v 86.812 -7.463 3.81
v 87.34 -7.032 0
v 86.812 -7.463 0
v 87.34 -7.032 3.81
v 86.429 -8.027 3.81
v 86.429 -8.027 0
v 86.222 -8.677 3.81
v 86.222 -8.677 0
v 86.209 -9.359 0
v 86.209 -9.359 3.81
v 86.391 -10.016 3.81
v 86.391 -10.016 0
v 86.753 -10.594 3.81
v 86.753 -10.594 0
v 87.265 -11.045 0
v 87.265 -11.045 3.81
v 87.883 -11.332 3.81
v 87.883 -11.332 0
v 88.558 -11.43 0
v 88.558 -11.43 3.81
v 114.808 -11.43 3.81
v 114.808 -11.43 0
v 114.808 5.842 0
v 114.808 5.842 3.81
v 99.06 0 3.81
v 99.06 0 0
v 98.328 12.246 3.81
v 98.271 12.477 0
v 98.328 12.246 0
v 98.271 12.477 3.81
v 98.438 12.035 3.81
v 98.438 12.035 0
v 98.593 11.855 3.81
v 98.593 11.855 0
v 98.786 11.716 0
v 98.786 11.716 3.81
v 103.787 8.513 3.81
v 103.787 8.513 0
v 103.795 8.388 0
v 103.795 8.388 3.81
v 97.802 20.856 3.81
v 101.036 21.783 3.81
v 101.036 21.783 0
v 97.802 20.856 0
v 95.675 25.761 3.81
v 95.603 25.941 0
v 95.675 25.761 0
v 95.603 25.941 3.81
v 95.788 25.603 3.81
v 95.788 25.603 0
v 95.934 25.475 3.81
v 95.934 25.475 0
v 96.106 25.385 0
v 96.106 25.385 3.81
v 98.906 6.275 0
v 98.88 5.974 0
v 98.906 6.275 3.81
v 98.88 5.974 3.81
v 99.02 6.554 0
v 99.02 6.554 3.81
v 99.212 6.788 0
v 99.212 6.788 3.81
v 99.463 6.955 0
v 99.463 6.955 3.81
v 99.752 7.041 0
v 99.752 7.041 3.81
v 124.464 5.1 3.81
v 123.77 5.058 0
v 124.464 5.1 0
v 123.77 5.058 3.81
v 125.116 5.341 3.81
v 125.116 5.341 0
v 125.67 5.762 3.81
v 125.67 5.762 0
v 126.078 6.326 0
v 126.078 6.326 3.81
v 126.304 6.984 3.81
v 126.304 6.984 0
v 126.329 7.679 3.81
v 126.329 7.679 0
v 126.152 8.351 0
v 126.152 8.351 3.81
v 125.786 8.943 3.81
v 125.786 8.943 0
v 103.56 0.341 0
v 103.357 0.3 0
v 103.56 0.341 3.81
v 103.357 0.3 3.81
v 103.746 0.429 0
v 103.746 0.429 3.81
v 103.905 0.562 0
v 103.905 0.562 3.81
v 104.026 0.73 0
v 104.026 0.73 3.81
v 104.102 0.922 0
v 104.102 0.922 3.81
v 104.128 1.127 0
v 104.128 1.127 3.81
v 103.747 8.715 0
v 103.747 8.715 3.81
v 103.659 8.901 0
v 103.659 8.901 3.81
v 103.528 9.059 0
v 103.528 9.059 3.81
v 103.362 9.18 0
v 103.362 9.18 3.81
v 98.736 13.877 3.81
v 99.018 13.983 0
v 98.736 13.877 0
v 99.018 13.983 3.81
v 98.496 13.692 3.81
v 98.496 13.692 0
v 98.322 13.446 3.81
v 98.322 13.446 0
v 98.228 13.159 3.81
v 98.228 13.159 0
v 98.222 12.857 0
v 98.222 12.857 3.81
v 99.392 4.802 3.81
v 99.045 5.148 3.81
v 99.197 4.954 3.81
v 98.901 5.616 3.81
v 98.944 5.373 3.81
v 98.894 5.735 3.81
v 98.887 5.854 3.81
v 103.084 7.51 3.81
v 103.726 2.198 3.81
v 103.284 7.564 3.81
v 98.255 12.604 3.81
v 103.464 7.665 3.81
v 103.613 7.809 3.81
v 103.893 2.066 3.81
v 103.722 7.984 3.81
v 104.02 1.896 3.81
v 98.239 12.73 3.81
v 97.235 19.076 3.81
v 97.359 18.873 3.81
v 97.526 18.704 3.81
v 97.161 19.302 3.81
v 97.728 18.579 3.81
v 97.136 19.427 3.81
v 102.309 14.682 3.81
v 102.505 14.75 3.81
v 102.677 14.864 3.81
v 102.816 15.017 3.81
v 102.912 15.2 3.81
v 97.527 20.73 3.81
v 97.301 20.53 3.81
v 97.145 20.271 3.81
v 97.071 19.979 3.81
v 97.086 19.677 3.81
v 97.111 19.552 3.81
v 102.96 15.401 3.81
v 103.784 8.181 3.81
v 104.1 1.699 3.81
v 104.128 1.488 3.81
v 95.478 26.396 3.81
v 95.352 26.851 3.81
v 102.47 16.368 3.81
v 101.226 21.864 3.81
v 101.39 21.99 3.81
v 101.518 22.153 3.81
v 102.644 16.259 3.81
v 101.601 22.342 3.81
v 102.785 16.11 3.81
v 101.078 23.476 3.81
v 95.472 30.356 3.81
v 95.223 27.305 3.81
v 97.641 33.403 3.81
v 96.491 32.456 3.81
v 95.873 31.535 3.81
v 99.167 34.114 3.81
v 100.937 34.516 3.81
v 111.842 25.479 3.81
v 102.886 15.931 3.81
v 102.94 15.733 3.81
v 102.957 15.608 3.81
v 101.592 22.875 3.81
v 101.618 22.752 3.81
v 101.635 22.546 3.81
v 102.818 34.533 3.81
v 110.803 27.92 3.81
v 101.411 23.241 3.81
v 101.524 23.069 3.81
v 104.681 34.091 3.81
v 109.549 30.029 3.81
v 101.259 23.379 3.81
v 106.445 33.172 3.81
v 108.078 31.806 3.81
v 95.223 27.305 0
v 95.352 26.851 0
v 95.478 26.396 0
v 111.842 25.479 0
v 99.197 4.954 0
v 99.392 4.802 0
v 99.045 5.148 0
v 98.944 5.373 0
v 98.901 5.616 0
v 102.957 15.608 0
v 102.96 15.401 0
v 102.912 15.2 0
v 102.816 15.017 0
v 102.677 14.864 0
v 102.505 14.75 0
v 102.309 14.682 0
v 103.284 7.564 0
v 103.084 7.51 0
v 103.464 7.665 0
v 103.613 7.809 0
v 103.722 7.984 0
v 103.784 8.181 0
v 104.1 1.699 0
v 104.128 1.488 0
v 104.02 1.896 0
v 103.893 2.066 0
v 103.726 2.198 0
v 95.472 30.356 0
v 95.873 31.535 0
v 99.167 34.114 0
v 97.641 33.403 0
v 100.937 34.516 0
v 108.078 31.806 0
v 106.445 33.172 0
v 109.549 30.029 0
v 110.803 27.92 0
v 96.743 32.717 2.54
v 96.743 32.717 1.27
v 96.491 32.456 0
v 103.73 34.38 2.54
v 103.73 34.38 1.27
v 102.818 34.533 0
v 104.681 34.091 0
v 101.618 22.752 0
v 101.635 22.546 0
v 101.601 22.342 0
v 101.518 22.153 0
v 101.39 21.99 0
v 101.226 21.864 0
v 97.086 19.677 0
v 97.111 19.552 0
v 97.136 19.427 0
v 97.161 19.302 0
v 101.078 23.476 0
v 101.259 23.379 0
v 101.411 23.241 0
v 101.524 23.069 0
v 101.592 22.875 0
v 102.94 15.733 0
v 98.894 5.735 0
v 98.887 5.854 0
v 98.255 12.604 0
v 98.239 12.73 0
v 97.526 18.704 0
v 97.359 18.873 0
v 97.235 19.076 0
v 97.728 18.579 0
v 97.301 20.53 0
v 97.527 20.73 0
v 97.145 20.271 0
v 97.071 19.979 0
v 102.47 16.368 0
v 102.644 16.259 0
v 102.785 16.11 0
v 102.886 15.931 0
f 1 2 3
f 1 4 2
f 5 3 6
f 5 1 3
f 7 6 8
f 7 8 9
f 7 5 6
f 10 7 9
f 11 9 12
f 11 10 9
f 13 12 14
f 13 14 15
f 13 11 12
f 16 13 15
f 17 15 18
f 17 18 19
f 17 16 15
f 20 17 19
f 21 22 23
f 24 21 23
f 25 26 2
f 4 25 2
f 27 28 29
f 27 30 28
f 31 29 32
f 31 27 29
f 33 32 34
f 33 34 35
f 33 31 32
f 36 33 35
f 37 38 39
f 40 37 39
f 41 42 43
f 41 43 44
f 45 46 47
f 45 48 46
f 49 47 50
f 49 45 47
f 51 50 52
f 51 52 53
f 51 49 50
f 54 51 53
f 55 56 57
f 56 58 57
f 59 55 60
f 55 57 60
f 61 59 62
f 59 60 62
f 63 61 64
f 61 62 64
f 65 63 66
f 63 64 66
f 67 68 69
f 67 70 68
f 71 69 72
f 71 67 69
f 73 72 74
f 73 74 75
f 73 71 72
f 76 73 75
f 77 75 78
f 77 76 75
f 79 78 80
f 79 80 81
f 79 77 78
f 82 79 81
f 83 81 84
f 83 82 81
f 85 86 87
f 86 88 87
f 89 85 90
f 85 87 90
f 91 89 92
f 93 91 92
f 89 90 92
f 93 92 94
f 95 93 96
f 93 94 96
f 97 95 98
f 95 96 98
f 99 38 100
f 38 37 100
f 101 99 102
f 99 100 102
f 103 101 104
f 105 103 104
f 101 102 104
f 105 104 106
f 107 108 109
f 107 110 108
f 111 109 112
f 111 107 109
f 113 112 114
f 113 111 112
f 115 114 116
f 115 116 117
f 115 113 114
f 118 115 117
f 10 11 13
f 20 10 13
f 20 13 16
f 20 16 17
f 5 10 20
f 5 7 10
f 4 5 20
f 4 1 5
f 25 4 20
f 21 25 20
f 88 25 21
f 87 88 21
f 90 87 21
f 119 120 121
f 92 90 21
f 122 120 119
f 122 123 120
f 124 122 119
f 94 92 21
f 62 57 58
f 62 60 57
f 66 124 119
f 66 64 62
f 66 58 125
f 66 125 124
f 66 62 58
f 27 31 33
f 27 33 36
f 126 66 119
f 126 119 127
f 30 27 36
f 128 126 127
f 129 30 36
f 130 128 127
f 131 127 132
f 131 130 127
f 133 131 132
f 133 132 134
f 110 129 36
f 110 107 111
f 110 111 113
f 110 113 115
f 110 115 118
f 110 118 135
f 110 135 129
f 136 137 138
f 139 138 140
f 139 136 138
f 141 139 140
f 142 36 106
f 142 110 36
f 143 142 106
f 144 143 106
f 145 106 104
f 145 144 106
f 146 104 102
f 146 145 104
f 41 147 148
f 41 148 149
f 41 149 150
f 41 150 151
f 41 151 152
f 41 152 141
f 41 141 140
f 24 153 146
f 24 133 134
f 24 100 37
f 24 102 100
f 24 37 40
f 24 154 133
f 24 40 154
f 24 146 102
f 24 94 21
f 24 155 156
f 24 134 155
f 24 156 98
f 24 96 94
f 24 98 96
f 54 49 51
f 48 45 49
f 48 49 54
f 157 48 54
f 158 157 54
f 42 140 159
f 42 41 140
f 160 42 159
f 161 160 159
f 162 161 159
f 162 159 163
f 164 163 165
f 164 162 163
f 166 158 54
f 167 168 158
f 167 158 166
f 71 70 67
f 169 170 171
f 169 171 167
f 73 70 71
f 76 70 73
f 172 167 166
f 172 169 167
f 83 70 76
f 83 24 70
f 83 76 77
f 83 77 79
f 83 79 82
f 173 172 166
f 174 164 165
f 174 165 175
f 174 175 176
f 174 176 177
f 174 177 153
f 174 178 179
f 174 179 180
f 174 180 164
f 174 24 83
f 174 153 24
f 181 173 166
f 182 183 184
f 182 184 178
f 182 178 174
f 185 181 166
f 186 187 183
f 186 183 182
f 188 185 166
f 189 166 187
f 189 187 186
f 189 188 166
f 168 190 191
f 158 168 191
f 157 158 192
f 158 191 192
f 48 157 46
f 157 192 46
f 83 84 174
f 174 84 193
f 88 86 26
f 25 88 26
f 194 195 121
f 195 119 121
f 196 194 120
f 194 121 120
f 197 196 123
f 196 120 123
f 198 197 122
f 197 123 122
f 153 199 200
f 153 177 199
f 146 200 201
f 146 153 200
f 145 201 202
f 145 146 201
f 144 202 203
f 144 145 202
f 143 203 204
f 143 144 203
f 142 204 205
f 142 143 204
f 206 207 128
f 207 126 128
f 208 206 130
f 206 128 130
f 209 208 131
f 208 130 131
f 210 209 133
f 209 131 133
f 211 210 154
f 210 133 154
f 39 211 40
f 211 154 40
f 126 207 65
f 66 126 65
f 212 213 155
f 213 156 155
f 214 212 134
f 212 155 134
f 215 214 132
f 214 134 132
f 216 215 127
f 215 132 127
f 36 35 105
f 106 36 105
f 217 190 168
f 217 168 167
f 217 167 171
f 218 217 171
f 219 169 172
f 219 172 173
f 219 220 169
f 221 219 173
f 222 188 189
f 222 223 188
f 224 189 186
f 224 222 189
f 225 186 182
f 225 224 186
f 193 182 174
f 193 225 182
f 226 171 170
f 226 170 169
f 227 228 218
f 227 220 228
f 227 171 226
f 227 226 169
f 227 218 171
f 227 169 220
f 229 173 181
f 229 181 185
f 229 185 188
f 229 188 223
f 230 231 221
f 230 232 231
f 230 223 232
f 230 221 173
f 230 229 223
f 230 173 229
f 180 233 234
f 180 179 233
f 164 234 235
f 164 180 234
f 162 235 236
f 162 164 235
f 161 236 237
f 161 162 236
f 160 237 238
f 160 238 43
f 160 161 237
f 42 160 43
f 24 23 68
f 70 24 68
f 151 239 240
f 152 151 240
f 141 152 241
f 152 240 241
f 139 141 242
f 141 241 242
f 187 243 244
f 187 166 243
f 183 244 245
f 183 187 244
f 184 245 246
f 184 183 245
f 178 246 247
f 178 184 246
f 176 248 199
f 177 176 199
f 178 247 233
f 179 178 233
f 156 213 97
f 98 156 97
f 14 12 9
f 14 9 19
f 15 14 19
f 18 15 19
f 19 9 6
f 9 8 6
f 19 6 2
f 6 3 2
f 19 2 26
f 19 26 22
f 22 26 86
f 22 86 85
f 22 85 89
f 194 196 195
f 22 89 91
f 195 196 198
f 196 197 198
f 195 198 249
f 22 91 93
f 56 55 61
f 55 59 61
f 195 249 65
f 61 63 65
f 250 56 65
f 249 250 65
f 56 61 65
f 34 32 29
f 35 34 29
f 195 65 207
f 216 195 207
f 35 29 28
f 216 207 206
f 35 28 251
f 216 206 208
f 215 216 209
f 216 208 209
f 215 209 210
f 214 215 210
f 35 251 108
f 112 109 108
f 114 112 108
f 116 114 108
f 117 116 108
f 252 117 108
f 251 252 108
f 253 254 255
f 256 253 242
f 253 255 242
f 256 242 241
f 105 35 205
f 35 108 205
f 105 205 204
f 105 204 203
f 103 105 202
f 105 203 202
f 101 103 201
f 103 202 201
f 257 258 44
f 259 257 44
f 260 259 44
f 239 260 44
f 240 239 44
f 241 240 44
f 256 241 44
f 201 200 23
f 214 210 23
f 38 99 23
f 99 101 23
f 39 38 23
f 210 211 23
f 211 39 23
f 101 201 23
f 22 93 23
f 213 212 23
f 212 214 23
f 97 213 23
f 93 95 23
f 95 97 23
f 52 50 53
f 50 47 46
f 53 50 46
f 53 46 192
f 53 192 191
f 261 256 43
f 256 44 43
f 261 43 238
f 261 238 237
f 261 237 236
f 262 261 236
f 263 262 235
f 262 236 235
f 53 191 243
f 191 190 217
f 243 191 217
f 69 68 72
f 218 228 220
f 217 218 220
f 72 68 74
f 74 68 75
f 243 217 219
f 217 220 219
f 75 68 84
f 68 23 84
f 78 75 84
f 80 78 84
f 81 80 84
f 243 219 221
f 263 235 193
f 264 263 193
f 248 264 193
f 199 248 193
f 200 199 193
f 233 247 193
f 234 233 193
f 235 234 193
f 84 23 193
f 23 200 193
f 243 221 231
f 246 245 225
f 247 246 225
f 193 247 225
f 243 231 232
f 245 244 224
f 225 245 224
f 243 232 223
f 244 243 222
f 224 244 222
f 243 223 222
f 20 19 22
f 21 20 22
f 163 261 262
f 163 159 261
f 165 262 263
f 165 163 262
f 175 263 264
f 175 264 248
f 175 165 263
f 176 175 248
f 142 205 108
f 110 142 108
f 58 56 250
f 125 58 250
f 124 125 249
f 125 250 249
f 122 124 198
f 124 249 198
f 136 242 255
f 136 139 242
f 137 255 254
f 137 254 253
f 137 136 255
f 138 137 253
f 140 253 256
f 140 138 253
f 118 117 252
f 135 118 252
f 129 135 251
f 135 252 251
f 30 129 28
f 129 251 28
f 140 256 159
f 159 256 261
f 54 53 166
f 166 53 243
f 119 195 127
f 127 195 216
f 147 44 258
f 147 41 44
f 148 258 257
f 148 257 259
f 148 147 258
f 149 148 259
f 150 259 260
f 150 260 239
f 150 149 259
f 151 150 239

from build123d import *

# Parameters (mm, degrees)
F1_DEPTH = 3.81
F2_R     = 2.367737602
F3_R     = 0.8284878815
F4_R     = 1.016


with BuildPart() as f1:
    # F0 (on Top) → F1 (new body)
    with BuildSketch(Plane.XY):
        with BuildLine():
            Line((98.3983673645, -11.43), (99.06, -11.43))
            Line((99.06, -11.43), (114.808, -11.43))
            Line((114.808, -11.43), (114.808, 5.842))
            add(Edge.make_bspline(
                [(111.8424964318, 25.4789244169), (114.050069317, 19.269012489), (114.16942194, 10.4852159403), (114.808, 5.842)],
                knots=[0.6566118261, 0.6566118261, 0.6566118261, 0.6566118261, 1, 1, 1, 1], degree=3))
            add(Edge.make_bspline(
                [(95.2225835996, 27.3046364672), (95.2454386696, 29.8195688516), (95.6622303832, 33.3481063354), (104.8322806826, 36.1190012322), (110.1233601043, 30.3148622281), (111.8424964318, 25.4789244169)],
                knots=[0, 0, 0, 0, 0.1826926903, 0.3892000055, 0.6566118261, 0.6566118261, 0.6566118261, 0.6566118261], degree=3))
            ThreePointArc((95.2225835996, 27.3046364672), (95.4714110254, 26.4214548581), (95.7120472042, 25.5360063436))
            Line((95.7120472042, 25.5360063436), (101.4981578414, 23.3149265672))
            Line((101.4981578414, 23.3149265672), (101.7785107441, 21.99596986))
            Line((101.7785107441, 21.99596986), (96.8953013287, 20.5957320924))
            ThreePointArc((96.8953013287, 20.5957320924), (97.0819149886, 19.6973445455), (97.2601992237, 18.7972670078))
            Line((97.2601992237, 18.7972670078), (102.8772804931, 16.1779789954))
            Line((102.8772804931, 16.1779789954), (103.0649447013, 14.8426787705))
            Line((103.0649447013, 14.8426787705), (98.0959548895, 13.7864873811))
            ThreePointArc((98.0959548895, 13.7864873811), (98.2194456206, 12.8772707503), (98.3345093292, 11.9669492766))
            Line((98.3345093292, 11.9669492766), (103.7551953754, 8.9622139361))
            Line((103.7551953754, 8.9622139361), (103.8492566079, 7.617075642))
            Line((103.8492566079, 7.617075642), (98.8186948187, 6.9100762891))
            ThreePointArc((98.8186948187, 6.9100762891), (98.8784103809, 5.9952948679), (98.9296578383, 5.08))
            Line((98.9296578383, 5.08), (104.1276253753, 1.956746008))
            Line((104.1276253753, 1.956746008), (104.1276253753, 0.3543628866))
            Line((104.1276253753, 0.3543628866), (99.06, 0))
            ThreePointArc((99.06, 0), (98.8944535126, -5.7245667466), (98.3983673645, -11.43))
        make_face()
        with BuildLine():
            Line((80.01, -11.43), (98.3983673645, -11.43))
            ThreePointArc((98.3983673645, -11.43), (98.8944535126, -5.7245667466), (99.06, 0))
            Line((99.06, 0), (80.01, -11.43))
        make_face()
        with BuildLine():
            add(Edge.make_bspline(
                [(111.8424964318, 25.4789244169), (114.050069317, 19.269012489), (114.16942194, 10.4852159403), (114.808, 5.842)],
                knots=[0.6566118261, 0.6566118261, 0.6566118261, 0.6566118261, 1, 1, 1, 1], degree=3))
            Line((114.808, 5.842), (129.4839402923, 4.5580215978))
            Line((129.4839402923, 4.5580215978), (111.8424964318, 25.4789244169))
        make_face()
    extrude(amount=F1_DEPTH)

    # F2
    f2_edges = [f1.edges().sort_by_distance(p)[0] for p in [
        (80.01, -11.43, 1.905),
        (129.48394, 4.558022, 1.905),
    ]]
    fillet(f2_edges, radius=F2_R)

    # F3
    f3_edges = [f1.edges().sort_by_distance(p)[0] for p in [
        (104.127625, 0.354363, 1.905),
        (104.127625, 1.956746, 1.905),
        (103.849257, 7.617076, 1.905),
        (103.755195, 8.962214, 1.905),
        (103.064945, 14.842679, 1.905),
        (102.87728, 16.177979, 1.905),
        (101.778511, 21.99597, 1.905),
        (101.498158, 23.314927, 1.905),
        (95.712047, 25.536006, 1.905),
    ]]
    fillet(f3_edges, radius=F3_R)

    # F4
    f4_edges = [f1.edges().sort_by_distance(p)[0] for p in [
        (98.818695, 6.910076, 1.905),
        (98.095955, 13.786487, 1.905),
        (96.895301, 20.595732, 1.905),
        (97.260199, 18.797267, 1.905),
        (98.334509, 11.966949, 1.905),
        (98.929658, 5.08, 1.905),
    ]]
    fillet(f4_edges, radius=F4_R)


solid = f1.part
